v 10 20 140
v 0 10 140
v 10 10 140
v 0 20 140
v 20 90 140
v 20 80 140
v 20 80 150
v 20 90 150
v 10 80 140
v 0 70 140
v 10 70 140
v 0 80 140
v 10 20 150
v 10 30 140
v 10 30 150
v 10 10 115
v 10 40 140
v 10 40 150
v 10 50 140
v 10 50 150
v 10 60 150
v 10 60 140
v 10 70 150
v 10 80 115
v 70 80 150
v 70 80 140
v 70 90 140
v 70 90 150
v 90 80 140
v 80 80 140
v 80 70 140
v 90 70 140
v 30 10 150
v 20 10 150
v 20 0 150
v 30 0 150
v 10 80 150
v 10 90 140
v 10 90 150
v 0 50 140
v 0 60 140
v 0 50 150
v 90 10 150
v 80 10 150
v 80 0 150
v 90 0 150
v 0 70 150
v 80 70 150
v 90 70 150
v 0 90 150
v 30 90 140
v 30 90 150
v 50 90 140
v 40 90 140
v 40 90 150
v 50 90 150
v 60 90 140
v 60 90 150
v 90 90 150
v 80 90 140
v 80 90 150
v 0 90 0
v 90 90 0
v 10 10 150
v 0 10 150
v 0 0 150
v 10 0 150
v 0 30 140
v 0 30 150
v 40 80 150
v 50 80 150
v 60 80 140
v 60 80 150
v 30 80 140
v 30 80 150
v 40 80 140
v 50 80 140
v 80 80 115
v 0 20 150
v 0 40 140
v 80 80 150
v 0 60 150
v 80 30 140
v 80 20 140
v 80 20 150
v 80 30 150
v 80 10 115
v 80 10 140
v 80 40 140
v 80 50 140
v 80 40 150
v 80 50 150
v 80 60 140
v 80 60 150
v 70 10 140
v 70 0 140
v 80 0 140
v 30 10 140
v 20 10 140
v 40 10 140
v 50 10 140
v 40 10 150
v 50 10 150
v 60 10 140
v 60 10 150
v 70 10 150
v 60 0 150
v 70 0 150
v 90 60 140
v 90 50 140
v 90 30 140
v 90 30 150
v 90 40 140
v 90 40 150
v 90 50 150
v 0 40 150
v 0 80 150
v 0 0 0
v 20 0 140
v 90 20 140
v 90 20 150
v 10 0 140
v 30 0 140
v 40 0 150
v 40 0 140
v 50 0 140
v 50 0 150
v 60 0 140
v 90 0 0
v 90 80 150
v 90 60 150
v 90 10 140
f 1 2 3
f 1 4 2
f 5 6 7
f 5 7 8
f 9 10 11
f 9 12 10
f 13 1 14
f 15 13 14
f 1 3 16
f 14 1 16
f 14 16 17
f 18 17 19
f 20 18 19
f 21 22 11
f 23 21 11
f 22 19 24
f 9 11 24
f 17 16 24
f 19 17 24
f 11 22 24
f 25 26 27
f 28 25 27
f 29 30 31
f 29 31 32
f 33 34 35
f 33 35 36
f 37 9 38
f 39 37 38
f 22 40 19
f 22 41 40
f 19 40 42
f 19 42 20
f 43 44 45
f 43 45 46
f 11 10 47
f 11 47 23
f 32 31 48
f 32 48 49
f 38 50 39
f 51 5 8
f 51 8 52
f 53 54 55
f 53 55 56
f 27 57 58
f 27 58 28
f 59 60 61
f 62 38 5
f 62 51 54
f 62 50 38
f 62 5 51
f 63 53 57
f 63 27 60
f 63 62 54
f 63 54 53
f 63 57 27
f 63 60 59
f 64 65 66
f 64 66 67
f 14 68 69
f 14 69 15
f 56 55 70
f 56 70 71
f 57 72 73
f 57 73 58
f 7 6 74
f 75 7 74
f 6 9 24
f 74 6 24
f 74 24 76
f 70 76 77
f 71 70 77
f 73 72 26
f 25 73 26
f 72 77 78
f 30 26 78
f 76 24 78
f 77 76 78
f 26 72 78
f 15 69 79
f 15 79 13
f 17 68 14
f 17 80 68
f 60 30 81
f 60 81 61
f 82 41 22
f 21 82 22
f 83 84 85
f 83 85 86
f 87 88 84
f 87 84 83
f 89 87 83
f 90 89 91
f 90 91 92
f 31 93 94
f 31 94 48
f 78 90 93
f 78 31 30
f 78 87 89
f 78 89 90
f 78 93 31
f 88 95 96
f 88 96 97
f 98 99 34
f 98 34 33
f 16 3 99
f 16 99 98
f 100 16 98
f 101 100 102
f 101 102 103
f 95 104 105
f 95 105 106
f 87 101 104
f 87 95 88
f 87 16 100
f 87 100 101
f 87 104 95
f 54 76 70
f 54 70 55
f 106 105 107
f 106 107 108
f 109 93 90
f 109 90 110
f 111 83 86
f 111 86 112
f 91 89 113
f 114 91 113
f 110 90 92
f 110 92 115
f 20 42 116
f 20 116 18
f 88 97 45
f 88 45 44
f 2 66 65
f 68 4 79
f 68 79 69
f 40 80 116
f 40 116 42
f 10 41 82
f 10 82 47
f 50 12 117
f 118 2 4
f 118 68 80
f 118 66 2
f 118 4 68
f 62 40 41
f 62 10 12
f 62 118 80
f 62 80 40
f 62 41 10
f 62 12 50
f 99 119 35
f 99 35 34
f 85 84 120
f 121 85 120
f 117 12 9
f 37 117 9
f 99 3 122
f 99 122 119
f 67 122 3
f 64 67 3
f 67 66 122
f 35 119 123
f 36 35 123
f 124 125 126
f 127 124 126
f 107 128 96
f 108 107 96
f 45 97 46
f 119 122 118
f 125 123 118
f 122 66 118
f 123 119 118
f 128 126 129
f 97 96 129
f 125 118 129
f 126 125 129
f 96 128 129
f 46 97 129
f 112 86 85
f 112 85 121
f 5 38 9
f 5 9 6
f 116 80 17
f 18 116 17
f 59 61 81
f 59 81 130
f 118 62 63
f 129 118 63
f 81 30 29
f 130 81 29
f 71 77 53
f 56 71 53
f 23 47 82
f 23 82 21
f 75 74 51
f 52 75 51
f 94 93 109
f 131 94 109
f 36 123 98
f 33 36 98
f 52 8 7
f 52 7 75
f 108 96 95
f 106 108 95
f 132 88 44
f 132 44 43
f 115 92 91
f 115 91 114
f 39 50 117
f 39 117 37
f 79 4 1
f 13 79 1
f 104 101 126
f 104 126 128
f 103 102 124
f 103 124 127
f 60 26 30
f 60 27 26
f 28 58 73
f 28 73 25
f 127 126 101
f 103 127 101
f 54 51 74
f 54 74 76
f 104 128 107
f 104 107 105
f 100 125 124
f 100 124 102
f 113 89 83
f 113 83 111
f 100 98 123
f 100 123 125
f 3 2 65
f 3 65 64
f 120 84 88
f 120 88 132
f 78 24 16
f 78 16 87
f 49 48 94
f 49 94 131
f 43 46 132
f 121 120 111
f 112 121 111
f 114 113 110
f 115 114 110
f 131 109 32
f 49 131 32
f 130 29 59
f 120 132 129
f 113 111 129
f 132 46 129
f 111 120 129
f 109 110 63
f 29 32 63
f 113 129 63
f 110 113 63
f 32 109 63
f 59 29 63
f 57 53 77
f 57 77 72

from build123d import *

# Parameters (mm, degrees)
BOX003_W         = 10
BOX003_H         = 110
BOX003_DEPTH     = 10
ARRAY001_X_COUNT = 4
ARRAY001_X_PITCH = 20
BOX002_W         = 110
BOX002_H         = 10
BOX002_DEPTH     = 10
ARRAY_X_COUNT    = 4
ARRAY_X_PITCH    = 20
BOX001_W         = 70
BOX001_H         = 70
BOX001_DEPTH     = 70
BOX_W            = 90
BOX_H            = 90
BOX_DEPTH        = 150


with BuildPart() as fusion001:
    # Box003 → Box003 (new body)
    with BuildSketch(Plane(origin=(10, -10, 140), x_dir=(1, 0, 0), z_dir=(0, 0, 1))):
        with Locations((5, 55)):
            Rectangle(BOX003_W, BOX003_H)
    extrude(amount=BOX003_DEPTH)

    # Array001 X: Fusion001 ×4


with BuildPart() as fusion001_1:
    add(fusion001.part)
    with Locations(*[(i * ARRAY001_X_PITCH, 0, 0) for i in range(1, ARRAY001_X_COUNT)]):
        add(fusion001.part)


with BuildPart() as fusion002:
    # Box002 → Box002 (new body)
    with BuildSketch(Plane(origin=(-10, 10, 140), x_dir=(1, 0, 0), z_dir=(0, 0, 1))):
        with Locations((55, 5)):
            Rectangle(BOX002_W, BOX002_H)
    extrude(amount=BOX002_DEPTH)

    # Array X: Fusion002 ×4


with BuildPart() as fusion002_1:
    add(fusion002.part)
    with Locations(*[(0, i * ARRAY_X_PITCH, 0) for i in range(1, ARRAY_X_COUNT)]):
        add(fusion002.part)

    # Fusion002: union Fusion001
    add(fusion001_1.part)


with BuildPart() as cube001:
    # Box001 → Box001 (new body)
    with BuildSketch(Plane(origin=(10, 10, 115), x_dir=(1, 0, 0), z_dir=(0, 0, 1))):
        with Locations((35, 35)):
            Rectangle(BOX001_W, BOX001_H)
    extrude(amount=BOX001_DEPTH)


with BuildPart() as torre:
    # Box → Box (new body)
    with BuildSketch(Plane.XY):
        with Locations((45, 45)):
            Rectangle(BOX_W, BOX_H)
    extrude(amount=BOX_DEPTH)

    # Cut: cut Cube001
    add(cube001.part, mode=Mode.SUBTRACT)

    # Cut001: cut Fusion002
    add(fusion002_1.part, mode=Mode.SUBTRACT)


solid = torre.part
